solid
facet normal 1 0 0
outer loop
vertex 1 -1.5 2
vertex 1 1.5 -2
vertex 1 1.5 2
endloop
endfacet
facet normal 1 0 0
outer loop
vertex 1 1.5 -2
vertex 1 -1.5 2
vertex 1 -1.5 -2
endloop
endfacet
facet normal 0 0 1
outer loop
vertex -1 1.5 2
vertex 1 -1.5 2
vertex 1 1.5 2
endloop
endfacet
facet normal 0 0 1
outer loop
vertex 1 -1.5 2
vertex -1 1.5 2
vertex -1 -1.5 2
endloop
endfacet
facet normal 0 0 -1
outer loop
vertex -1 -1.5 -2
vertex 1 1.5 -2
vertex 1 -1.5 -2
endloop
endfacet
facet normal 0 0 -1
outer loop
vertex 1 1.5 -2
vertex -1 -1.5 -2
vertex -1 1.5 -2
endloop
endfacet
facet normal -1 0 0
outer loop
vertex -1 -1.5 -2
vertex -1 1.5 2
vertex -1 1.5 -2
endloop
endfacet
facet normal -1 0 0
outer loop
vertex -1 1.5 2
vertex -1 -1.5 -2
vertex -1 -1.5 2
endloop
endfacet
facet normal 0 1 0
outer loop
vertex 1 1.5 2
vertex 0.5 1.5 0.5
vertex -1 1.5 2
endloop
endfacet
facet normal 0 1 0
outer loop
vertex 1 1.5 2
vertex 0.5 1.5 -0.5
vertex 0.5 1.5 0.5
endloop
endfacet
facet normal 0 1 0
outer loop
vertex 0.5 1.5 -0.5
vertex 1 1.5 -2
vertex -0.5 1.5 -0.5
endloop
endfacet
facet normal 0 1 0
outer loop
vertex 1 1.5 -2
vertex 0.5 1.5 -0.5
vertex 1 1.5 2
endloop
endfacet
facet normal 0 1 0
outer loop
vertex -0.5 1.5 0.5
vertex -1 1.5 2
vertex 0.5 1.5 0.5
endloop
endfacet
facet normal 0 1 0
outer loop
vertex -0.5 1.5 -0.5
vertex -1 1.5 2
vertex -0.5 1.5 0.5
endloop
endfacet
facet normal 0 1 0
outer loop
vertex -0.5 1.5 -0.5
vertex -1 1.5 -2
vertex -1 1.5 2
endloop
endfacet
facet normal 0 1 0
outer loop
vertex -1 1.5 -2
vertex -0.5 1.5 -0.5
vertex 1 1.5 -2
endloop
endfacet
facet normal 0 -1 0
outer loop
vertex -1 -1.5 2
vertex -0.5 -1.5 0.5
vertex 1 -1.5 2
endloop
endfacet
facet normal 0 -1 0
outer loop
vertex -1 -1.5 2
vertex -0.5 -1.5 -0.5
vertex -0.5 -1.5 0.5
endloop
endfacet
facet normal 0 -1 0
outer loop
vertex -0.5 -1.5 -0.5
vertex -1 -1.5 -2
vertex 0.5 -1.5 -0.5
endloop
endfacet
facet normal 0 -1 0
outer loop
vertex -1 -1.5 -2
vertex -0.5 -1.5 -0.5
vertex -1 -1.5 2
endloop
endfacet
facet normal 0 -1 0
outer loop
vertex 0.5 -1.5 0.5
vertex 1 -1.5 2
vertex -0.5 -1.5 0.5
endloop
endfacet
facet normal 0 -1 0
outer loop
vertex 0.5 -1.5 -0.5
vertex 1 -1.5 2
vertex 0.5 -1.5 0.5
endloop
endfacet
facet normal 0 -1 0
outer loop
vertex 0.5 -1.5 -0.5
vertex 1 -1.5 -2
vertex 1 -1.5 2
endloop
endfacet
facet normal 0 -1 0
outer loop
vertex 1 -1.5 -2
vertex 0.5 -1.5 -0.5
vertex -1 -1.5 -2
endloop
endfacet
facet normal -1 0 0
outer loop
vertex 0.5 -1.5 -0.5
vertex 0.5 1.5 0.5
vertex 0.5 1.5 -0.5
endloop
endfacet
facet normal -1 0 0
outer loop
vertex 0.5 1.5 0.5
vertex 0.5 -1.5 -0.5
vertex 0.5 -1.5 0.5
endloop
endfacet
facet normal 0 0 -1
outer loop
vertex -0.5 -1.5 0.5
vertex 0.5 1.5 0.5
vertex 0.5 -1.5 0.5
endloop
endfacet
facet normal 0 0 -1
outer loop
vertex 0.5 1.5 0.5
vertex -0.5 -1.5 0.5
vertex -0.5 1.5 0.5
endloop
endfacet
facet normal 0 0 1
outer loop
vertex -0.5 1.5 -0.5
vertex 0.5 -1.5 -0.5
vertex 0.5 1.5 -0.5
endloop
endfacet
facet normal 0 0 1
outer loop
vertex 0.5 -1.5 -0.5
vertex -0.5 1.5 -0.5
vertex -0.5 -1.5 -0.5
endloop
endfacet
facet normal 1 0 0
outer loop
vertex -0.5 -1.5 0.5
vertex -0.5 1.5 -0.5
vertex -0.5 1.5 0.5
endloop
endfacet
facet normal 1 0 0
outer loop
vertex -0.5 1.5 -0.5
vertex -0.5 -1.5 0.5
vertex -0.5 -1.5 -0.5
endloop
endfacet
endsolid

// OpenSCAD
module work() 
    difference() {
	    cube([2,3,4], center=true);
	    cube([1,99,1], center=true);
    }

work();
